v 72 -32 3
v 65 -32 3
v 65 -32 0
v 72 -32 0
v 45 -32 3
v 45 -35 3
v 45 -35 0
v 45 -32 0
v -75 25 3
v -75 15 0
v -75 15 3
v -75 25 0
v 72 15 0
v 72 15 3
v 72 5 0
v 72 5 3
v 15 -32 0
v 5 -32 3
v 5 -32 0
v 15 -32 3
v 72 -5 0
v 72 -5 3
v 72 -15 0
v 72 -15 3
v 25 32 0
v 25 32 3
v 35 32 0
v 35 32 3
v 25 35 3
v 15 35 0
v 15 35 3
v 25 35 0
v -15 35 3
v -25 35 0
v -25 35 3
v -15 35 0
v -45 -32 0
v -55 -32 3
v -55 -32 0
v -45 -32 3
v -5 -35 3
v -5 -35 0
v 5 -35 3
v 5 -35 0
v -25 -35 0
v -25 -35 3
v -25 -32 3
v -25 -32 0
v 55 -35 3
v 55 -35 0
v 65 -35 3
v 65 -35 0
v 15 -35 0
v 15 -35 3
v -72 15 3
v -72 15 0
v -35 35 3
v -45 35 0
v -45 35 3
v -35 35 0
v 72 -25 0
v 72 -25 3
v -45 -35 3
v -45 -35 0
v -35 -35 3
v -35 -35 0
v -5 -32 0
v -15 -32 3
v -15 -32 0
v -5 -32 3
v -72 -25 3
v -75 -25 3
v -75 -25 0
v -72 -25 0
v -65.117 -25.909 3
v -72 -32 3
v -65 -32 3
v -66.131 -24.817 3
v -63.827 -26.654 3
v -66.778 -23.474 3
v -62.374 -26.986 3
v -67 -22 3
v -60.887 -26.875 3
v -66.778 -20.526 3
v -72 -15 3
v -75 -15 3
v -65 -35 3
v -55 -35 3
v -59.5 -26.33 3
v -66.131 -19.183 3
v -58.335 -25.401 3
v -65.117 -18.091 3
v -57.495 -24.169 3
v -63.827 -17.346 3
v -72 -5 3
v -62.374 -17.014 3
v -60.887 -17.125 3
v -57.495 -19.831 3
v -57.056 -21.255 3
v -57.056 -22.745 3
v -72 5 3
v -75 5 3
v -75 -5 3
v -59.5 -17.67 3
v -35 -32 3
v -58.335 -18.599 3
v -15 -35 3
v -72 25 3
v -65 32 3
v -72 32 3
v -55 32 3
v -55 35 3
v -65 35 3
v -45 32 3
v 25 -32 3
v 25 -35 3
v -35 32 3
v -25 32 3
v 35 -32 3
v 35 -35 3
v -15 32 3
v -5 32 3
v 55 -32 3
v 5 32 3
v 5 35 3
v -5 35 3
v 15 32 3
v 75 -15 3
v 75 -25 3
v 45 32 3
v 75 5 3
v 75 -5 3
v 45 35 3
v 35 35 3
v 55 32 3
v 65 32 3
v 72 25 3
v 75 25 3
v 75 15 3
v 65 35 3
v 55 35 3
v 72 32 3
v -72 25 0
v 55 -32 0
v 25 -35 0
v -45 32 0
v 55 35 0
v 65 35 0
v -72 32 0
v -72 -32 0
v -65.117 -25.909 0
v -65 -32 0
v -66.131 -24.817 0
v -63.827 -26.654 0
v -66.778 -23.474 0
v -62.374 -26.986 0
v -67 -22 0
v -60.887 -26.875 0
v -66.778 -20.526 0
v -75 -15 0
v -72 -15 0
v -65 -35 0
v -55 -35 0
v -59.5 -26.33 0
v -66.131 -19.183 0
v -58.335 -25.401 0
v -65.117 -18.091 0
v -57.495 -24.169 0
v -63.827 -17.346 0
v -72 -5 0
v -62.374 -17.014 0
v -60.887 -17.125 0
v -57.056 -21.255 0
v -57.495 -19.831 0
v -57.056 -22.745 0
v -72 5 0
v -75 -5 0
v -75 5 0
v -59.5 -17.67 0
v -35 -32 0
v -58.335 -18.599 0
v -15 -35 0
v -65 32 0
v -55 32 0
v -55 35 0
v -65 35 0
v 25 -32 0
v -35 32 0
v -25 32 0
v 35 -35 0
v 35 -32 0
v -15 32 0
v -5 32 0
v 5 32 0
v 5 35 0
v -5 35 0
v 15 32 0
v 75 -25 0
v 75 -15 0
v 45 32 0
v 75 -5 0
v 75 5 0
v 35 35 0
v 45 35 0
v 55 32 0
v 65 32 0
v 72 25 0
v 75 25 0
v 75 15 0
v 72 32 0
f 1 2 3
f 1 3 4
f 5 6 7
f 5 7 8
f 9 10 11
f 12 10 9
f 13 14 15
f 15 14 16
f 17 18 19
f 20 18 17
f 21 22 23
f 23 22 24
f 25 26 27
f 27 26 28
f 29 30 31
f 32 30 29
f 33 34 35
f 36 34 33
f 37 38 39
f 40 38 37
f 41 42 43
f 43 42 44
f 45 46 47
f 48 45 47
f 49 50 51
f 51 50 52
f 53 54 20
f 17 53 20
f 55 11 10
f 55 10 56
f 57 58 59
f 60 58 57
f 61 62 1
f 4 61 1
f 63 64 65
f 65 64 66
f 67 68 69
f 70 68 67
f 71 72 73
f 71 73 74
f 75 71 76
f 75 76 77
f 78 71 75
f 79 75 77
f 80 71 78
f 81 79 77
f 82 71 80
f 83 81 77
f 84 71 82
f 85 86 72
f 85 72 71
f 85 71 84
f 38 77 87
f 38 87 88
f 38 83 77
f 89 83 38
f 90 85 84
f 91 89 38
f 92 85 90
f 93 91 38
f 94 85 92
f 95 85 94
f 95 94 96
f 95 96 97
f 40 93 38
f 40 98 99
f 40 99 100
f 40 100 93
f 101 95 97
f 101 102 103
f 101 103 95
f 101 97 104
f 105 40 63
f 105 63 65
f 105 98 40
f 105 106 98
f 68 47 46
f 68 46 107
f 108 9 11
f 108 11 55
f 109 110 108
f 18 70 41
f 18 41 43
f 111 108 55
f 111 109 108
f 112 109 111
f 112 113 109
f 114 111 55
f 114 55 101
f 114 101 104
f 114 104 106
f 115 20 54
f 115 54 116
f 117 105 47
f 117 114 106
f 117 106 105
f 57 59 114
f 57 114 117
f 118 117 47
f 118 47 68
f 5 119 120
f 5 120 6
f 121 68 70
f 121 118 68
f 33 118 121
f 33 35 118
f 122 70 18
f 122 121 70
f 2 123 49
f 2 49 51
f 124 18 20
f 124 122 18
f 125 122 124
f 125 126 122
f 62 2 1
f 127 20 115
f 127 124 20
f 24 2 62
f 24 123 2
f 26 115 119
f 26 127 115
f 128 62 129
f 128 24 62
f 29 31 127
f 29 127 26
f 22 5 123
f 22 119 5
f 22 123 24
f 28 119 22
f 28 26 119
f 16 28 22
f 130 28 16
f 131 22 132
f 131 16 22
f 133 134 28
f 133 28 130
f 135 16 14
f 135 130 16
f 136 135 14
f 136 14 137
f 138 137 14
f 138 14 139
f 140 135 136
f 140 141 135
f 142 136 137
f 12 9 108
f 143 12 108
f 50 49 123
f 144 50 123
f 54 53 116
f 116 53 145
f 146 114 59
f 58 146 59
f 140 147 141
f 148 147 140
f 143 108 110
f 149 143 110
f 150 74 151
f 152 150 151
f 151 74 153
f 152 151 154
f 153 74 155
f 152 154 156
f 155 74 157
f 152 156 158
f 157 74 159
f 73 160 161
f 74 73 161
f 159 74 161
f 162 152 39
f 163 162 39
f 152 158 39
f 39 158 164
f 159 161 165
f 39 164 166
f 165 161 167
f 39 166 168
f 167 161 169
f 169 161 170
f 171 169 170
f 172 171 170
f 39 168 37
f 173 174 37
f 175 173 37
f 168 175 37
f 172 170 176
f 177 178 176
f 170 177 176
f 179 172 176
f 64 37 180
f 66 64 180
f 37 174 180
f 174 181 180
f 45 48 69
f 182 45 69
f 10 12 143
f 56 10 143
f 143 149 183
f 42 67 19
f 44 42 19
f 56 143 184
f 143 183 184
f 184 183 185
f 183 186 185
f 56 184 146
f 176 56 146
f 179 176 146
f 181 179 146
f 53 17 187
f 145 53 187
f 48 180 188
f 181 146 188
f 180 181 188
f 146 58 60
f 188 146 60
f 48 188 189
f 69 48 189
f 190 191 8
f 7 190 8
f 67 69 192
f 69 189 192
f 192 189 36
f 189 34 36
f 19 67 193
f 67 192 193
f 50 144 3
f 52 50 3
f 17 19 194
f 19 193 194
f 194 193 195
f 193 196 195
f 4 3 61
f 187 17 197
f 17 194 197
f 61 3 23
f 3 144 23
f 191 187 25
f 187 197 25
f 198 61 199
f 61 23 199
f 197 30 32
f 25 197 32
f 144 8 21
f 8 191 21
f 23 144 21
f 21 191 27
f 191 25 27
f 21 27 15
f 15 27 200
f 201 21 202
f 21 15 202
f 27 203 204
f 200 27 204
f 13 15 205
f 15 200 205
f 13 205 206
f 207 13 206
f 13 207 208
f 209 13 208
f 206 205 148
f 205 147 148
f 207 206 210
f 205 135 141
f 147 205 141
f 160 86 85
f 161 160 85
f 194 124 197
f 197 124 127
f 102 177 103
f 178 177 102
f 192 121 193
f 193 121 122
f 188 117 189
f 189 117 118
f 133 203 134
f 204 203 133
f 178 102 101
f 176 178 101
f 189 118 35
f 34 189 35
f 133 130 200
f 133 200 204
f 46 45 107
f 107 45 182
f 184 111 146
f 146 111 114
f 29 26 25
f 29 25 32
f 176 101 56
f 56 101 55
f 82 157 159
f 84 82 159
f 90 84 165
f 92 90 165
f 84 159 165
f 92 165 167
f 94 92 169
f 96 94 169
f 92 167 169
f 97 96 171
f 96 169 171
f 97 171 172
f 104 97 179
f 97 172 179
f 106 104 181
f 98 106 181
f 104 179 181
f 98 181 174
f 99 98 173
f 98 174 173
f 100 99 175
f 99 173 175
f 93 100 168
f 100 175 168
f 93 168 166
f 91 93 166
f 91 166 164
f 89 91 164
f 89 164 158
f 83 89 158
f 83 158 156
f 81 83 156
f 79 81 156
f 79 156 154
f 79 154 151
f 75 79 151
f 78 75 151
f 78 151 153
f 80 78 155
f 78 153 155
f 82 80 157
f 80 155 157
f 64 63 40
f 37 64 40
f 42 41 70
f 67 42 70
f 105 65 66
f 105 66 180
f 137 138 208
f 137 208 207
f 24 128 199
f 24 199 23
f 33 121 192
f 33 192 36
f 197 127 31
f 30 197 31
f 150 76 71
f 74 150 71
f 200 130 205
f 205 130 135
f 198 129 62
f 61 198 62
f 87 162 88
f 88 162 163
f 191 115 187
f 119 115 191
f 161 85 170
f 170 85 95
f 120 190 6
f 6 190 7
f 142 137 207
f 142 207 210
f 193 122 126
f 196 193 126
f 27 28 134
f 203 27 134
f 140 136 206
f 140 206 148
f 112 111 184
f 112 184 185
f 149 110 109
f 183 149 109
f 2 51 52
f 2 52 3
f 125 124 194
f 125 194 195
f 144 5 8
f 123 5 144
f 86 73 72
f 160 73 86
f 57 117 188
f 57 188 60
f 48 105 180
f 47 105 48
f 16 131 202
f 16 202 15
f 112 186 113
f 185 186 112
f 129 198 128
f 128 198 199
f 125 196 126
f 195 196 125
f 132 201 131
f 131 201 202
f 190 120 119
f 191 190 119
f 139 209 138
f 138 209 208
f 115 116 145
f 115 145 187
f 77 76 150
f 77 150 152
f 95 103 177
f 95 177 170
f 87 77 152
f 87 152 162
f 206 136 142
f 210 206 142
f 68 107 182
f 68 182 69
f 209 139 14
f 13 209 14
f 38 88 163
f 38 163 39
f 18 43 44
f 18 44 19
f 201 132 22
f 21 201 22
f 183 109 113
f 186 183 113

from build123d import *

# Parameters (mm, degrees)
SKETCH1_W               = 150
SKETCH1_H               = 70
BOSS_EXTRUDE1_DEPTH     = 3
SKETCH2_W               = 10
SKETCH2_H               = 3
CUT_EXTRUDE1_DEPTH      = 3
LPATTERN3_COUNT         = 8
LPATTERN3_PITCH         = 20
MIRROR1_COPY_1_SKETCH_W = 10
MIRROR1_COPY_1_SKETCH_H = 3
MIRROR1_COPY_1_DEPTH    = 3
MIRROR1_COPY_2_SKETCH_W = 10
MIRROR1_COPY_2_SKETCH_H = 3
MIRROR1_COPY_2_DEPTH    = 3
MIRROR1_COPY_3_SKETCH_W = 10
MIRROR1_COPY_3_SKETCH_H = 3
MIRROR1_COPY_3_DEPTH    = 3
MIRROR1_COPY_4_SKETCH_W = 10
MIRROR1_COPY_4_SKETCH_H = 3
MIRROR1_COPY_4_DEPTH    = 3
MIRROR1_COPY_5_SKETCH_W = 10
MIRROR1_COPY_5_SKETCH_H = 3
MIRROR1_COPY_5_DEPTH    = 3
MIRROR1_COPY_6_SKETCH_W = 10
MIRROR1_COPY_6_SKETCH_H = 3
MIRROR1_COPY_6_DEPTH    = 3
MIRROR1_COPY_7_SKETCH_W = 10
MIRROR1_COPY_7_SKETCH_H = 3
MIRROR1_COPY_7_DEPTH    = 3
SKETCH3_W               = 3
SKETCH3_H               = 10
CUT_EXTRUDE2_DEPTH      = 3
LPATTERN4_COUNT         = 4
LPATTERN4_PITCH         = 20
MIRROR2_COPY_1_SKETCH_W = 3
MIRROR2_COPY_1_SKETCH_H = 10
MIRROR2_COPY_1_DEPTH    = 3
MIRROR2_COPY_2_SKETCH_W = 3
MIRROR2_COPY_2_SKETCH_H = 10
MIRROR2_COPY_2_DEPTH    = 3
MIRROR2_COPY_3_SKETCH_W = 3
MIRROR2_COPY_3_SKETCH_H = 10
MIRROR2_COPY_3_DEPTH    = 3
SKETCH6_R               = 5
CUT_EXTRUDE3_DEPTH      = 3


with BuildPart() as part:
    # Sketch1 → Boss-Extrude1 (new body)
    with BuildSketch(Plane.XY):
        Rectangle(SKETCH1_W, SKETCH1_H)
    extrude(amount=BOSS_EXTRUDE1_DEPTH)

    # Sketch2 → Cut-Extrude1 (cut)
    with BuildSketch(Plane.XY.offset(3)):
        with Locations((-70, 33.5)):
            Rectangle(SKETCH2_W, SKETCH2_H)
    cut_extrude1 = extrude(amount=-CUT_EXTRUDE1_DEPTH, mode=Mode.SUBTRACT)

    # LPattern3: Cut-Extrude1 ×8
    with Locations(*[(i * LPATTERN3_PITCH, 0, 0) for i in range(1, LPATTERN3_COUNT)]):
        add(cut_extrude1, mode=Mode.SUBTRACT)

    # Mirror1: Cut-Extrude1 across plane
    add(cut_extrude1.mirror(Plane.ZX), mode=Mode.SUBTRACT)

    # Mirror1 copy 1 sketch → Mirror1 copy 1 (cut)
    with BuildSketch(Plane(origin=(20, 0, 3), x_dir=(1, 0, 0), z_dir=(0, 0, 1))):
        with Locations((-70, -33.5)):
            Rectangle(MIRROR1_COPY_1_SKETCH_W, MIRROR1_COPY_1_SKETCH_H)
    extrude(amount=-MIRROR1_COPY_1_DEPTH, mode=Mode.SUBTRACT)

    # Mirror1 copy 2 sketch → Mirror1 copy 2 (cut)
    with BuildSketch(Plane(origin=(40, 0, 3), x_dir=(1, 0, 0), z_dir=(0, 0, 1))):
        with Locations((-70, -33.5)):
            Rectangle(MIRROR1_COPY_2_SKETCH_W, MIRROR1_COPY_2_SKETCH_H)
    extrude(amount=-MIRROR1_COPY_2_DEPTH, mode=Mode.SUBTRACT)

    # Mirror1 copy 3 sketch → Mirror1 copy 3 (cut)
    with BuildSketch(Plane(origin=(60, 0, 3), x_dir=(1, 0, 0), z_dir=(0, 0, 1))):
        with Locations((-70, -33.5)):
            Rectangle(MIRROR1_COPY_3_SKETCH_W, MIRROR1_COPY_3_SKETCH_H)
    extrude(amount=-MIRROR1_COPY_3_DEPTH, mode=Mode.SUBTRACT)

    # Mirror1 copy 4 sketch → Mirror1 copy 4 (cut)
    with BuildSketch(Plane(origin=(80, 0, 3), x_dir=(1, 0, 0), z_dir=(0, 0, 1))):
        with Locations((-70, -33.5)):
            Rectangle(MIRROR1_COPY_4_SKETCH_W, MIRROR1_COPY_4_SKETCH_H)
    extrude(amount=-MIRROR1_COPY_4_DEPTH, mode=Mode.SUBTRACT)

    # Mirror1 copy 5 sketch → Mirror1 copy 5 (cut)
    with BuildSketch(Plane(origin=(100, 0, 3), x_dir=(1, 0, 0), z_dir=(0, 0, 1))):
        with Locations((-70, -33.5)):
            Rectangle(MIRROR1_COPY_5_SKETCH_W, MIRROR1_COPY_5_SKETCH_H)
    extrude(amount=-MIRROR1_COPY_5_DEPTH, mode=Mode.SUBTRACT)

    # Mirror1 copy 6 sketch → Mirror1 copy 6 (cut)
    with BuildSketch(Plane(origin=(120, 0, 3), x_dir=(1, 0, 0), z_dir=(0, 0, 1))):
        with Locations((-70, -33.5)):
            Rectangle(MIRROR1_COPY_6_SKETCH_W, MIRROR1_COPY_6_SKETCH_H)
    extrude(amount=-MIRROR1_COPY_6_DEPTH, mode=Mode.SUBTRACT)

    # Mirror1 copy 7 sketch → Mirror1 copy 7 (cut)
    with BuildSketch(Plane(origin=(140, 0, 3), x_dir=(1, 0, 0), z_dir=(0, 0, 1))):
        with Locations((-70, -33.5)):
            Rectangle(MIRROR1_COPY_7_SKETCH_W, MIRROR1_COPY_7_SKETCH_H)
    extrude(amount=-MIRROR1_COPY_7_DEPTH, mode=Mode.SUBTRACT)

    # Sketch3 → Cut-Extrude2 (cut)
    with BuildSketch(Plane.XY.offset(3)):
        with Locations((-73.5, 30)):
            Rectangle(SKETCH3_W, SKETCH3_H)
    cut_extrude2 = extrude(amount=-CUT_EXTRUDE2_DEPTH, mode=Mode.SUBTRACT)

    # LPattern4: Cut-Extrude2 ×4
    with Locations(*[(0, -i * LPATTERN4_PITCH, 0) for i in range(1, LPATTERN4_COUNT)]):
        add(cut_extrude2, mode=Mode.SUBTRACT)

    # Mirror2: Cut-Extrude2 across plane
    add(cut_extrude2.mirror(Plane(origin=(0, 0, 0), x_dir=(0, 0, 1), z_dir=(1, 0, 0))), mode=Mode.SUBTRACT)

    # Mirror2 copy 1 sketch → Mirror2 copy 1 (cut)
    with BuildSketch(Plane(origin=(0, -20, 3), x_dir=(-1, 0, 0), z_dir=(0, 0, 1))):
        with Locations((-73.5, -30)):
            Rectangle(MIRROR2_COPY_1_SKETCH_W, MIRROR2_COPY_1_SKETCH_H)
    extrude(amount=-MIRROR2_COPY_1_DEPTH, mode=Mode.SUBTRACT)

    # Mirror2 copy 2 sketch → Mirror2 copy 2 (cut)
    with BuildSketch(Plane(origin=(0, -40, 3), x_dir=(-1, 0, 0), z_dir=(0, 0, 1))):
        with Locations((-73.5, -30)):
            Rectangle(MIRROR2_COPY_2_SKETCH_W, MIRROR2_COPY_2_SKETCH_H)
    extrude(amount=-MIRROR2_COPY_2_DEPTH, mode=Mode.SUBTRACT)

    # Mirror2 copy 3 sketch → Mirror2 copy 3 (cut)
    with BuildSketch(Plane(origin=(0, -60, 3), x_dir=(-1, 0, 0), z_dir=(0, 0, 1))):
        with Locations((-73.5, -30)):
            Rectangle(MIRROR2_COPY_3_SKETCH_W, MIRROR2_COPY_3_SKETCH_H)
    extrude(amount=-MIRROR2_COPY_3_DEPTH, mode=Mode.SUBTRACT)

    # Sketch6 → Cut-Extrude3 (cut)
    with BuildSketch(Plane(origin=(0, 0, 0), x_dir=(-1, 0, 0), z_dir=(0, 0, -1))):
        with Locations((62, -22)):
            Circle(SKETCH6_R)
    extrude(amount=-CUT_EXTRUDE3_DEPTH, mode=Mode.SUBTRACT)


solid = part.part
